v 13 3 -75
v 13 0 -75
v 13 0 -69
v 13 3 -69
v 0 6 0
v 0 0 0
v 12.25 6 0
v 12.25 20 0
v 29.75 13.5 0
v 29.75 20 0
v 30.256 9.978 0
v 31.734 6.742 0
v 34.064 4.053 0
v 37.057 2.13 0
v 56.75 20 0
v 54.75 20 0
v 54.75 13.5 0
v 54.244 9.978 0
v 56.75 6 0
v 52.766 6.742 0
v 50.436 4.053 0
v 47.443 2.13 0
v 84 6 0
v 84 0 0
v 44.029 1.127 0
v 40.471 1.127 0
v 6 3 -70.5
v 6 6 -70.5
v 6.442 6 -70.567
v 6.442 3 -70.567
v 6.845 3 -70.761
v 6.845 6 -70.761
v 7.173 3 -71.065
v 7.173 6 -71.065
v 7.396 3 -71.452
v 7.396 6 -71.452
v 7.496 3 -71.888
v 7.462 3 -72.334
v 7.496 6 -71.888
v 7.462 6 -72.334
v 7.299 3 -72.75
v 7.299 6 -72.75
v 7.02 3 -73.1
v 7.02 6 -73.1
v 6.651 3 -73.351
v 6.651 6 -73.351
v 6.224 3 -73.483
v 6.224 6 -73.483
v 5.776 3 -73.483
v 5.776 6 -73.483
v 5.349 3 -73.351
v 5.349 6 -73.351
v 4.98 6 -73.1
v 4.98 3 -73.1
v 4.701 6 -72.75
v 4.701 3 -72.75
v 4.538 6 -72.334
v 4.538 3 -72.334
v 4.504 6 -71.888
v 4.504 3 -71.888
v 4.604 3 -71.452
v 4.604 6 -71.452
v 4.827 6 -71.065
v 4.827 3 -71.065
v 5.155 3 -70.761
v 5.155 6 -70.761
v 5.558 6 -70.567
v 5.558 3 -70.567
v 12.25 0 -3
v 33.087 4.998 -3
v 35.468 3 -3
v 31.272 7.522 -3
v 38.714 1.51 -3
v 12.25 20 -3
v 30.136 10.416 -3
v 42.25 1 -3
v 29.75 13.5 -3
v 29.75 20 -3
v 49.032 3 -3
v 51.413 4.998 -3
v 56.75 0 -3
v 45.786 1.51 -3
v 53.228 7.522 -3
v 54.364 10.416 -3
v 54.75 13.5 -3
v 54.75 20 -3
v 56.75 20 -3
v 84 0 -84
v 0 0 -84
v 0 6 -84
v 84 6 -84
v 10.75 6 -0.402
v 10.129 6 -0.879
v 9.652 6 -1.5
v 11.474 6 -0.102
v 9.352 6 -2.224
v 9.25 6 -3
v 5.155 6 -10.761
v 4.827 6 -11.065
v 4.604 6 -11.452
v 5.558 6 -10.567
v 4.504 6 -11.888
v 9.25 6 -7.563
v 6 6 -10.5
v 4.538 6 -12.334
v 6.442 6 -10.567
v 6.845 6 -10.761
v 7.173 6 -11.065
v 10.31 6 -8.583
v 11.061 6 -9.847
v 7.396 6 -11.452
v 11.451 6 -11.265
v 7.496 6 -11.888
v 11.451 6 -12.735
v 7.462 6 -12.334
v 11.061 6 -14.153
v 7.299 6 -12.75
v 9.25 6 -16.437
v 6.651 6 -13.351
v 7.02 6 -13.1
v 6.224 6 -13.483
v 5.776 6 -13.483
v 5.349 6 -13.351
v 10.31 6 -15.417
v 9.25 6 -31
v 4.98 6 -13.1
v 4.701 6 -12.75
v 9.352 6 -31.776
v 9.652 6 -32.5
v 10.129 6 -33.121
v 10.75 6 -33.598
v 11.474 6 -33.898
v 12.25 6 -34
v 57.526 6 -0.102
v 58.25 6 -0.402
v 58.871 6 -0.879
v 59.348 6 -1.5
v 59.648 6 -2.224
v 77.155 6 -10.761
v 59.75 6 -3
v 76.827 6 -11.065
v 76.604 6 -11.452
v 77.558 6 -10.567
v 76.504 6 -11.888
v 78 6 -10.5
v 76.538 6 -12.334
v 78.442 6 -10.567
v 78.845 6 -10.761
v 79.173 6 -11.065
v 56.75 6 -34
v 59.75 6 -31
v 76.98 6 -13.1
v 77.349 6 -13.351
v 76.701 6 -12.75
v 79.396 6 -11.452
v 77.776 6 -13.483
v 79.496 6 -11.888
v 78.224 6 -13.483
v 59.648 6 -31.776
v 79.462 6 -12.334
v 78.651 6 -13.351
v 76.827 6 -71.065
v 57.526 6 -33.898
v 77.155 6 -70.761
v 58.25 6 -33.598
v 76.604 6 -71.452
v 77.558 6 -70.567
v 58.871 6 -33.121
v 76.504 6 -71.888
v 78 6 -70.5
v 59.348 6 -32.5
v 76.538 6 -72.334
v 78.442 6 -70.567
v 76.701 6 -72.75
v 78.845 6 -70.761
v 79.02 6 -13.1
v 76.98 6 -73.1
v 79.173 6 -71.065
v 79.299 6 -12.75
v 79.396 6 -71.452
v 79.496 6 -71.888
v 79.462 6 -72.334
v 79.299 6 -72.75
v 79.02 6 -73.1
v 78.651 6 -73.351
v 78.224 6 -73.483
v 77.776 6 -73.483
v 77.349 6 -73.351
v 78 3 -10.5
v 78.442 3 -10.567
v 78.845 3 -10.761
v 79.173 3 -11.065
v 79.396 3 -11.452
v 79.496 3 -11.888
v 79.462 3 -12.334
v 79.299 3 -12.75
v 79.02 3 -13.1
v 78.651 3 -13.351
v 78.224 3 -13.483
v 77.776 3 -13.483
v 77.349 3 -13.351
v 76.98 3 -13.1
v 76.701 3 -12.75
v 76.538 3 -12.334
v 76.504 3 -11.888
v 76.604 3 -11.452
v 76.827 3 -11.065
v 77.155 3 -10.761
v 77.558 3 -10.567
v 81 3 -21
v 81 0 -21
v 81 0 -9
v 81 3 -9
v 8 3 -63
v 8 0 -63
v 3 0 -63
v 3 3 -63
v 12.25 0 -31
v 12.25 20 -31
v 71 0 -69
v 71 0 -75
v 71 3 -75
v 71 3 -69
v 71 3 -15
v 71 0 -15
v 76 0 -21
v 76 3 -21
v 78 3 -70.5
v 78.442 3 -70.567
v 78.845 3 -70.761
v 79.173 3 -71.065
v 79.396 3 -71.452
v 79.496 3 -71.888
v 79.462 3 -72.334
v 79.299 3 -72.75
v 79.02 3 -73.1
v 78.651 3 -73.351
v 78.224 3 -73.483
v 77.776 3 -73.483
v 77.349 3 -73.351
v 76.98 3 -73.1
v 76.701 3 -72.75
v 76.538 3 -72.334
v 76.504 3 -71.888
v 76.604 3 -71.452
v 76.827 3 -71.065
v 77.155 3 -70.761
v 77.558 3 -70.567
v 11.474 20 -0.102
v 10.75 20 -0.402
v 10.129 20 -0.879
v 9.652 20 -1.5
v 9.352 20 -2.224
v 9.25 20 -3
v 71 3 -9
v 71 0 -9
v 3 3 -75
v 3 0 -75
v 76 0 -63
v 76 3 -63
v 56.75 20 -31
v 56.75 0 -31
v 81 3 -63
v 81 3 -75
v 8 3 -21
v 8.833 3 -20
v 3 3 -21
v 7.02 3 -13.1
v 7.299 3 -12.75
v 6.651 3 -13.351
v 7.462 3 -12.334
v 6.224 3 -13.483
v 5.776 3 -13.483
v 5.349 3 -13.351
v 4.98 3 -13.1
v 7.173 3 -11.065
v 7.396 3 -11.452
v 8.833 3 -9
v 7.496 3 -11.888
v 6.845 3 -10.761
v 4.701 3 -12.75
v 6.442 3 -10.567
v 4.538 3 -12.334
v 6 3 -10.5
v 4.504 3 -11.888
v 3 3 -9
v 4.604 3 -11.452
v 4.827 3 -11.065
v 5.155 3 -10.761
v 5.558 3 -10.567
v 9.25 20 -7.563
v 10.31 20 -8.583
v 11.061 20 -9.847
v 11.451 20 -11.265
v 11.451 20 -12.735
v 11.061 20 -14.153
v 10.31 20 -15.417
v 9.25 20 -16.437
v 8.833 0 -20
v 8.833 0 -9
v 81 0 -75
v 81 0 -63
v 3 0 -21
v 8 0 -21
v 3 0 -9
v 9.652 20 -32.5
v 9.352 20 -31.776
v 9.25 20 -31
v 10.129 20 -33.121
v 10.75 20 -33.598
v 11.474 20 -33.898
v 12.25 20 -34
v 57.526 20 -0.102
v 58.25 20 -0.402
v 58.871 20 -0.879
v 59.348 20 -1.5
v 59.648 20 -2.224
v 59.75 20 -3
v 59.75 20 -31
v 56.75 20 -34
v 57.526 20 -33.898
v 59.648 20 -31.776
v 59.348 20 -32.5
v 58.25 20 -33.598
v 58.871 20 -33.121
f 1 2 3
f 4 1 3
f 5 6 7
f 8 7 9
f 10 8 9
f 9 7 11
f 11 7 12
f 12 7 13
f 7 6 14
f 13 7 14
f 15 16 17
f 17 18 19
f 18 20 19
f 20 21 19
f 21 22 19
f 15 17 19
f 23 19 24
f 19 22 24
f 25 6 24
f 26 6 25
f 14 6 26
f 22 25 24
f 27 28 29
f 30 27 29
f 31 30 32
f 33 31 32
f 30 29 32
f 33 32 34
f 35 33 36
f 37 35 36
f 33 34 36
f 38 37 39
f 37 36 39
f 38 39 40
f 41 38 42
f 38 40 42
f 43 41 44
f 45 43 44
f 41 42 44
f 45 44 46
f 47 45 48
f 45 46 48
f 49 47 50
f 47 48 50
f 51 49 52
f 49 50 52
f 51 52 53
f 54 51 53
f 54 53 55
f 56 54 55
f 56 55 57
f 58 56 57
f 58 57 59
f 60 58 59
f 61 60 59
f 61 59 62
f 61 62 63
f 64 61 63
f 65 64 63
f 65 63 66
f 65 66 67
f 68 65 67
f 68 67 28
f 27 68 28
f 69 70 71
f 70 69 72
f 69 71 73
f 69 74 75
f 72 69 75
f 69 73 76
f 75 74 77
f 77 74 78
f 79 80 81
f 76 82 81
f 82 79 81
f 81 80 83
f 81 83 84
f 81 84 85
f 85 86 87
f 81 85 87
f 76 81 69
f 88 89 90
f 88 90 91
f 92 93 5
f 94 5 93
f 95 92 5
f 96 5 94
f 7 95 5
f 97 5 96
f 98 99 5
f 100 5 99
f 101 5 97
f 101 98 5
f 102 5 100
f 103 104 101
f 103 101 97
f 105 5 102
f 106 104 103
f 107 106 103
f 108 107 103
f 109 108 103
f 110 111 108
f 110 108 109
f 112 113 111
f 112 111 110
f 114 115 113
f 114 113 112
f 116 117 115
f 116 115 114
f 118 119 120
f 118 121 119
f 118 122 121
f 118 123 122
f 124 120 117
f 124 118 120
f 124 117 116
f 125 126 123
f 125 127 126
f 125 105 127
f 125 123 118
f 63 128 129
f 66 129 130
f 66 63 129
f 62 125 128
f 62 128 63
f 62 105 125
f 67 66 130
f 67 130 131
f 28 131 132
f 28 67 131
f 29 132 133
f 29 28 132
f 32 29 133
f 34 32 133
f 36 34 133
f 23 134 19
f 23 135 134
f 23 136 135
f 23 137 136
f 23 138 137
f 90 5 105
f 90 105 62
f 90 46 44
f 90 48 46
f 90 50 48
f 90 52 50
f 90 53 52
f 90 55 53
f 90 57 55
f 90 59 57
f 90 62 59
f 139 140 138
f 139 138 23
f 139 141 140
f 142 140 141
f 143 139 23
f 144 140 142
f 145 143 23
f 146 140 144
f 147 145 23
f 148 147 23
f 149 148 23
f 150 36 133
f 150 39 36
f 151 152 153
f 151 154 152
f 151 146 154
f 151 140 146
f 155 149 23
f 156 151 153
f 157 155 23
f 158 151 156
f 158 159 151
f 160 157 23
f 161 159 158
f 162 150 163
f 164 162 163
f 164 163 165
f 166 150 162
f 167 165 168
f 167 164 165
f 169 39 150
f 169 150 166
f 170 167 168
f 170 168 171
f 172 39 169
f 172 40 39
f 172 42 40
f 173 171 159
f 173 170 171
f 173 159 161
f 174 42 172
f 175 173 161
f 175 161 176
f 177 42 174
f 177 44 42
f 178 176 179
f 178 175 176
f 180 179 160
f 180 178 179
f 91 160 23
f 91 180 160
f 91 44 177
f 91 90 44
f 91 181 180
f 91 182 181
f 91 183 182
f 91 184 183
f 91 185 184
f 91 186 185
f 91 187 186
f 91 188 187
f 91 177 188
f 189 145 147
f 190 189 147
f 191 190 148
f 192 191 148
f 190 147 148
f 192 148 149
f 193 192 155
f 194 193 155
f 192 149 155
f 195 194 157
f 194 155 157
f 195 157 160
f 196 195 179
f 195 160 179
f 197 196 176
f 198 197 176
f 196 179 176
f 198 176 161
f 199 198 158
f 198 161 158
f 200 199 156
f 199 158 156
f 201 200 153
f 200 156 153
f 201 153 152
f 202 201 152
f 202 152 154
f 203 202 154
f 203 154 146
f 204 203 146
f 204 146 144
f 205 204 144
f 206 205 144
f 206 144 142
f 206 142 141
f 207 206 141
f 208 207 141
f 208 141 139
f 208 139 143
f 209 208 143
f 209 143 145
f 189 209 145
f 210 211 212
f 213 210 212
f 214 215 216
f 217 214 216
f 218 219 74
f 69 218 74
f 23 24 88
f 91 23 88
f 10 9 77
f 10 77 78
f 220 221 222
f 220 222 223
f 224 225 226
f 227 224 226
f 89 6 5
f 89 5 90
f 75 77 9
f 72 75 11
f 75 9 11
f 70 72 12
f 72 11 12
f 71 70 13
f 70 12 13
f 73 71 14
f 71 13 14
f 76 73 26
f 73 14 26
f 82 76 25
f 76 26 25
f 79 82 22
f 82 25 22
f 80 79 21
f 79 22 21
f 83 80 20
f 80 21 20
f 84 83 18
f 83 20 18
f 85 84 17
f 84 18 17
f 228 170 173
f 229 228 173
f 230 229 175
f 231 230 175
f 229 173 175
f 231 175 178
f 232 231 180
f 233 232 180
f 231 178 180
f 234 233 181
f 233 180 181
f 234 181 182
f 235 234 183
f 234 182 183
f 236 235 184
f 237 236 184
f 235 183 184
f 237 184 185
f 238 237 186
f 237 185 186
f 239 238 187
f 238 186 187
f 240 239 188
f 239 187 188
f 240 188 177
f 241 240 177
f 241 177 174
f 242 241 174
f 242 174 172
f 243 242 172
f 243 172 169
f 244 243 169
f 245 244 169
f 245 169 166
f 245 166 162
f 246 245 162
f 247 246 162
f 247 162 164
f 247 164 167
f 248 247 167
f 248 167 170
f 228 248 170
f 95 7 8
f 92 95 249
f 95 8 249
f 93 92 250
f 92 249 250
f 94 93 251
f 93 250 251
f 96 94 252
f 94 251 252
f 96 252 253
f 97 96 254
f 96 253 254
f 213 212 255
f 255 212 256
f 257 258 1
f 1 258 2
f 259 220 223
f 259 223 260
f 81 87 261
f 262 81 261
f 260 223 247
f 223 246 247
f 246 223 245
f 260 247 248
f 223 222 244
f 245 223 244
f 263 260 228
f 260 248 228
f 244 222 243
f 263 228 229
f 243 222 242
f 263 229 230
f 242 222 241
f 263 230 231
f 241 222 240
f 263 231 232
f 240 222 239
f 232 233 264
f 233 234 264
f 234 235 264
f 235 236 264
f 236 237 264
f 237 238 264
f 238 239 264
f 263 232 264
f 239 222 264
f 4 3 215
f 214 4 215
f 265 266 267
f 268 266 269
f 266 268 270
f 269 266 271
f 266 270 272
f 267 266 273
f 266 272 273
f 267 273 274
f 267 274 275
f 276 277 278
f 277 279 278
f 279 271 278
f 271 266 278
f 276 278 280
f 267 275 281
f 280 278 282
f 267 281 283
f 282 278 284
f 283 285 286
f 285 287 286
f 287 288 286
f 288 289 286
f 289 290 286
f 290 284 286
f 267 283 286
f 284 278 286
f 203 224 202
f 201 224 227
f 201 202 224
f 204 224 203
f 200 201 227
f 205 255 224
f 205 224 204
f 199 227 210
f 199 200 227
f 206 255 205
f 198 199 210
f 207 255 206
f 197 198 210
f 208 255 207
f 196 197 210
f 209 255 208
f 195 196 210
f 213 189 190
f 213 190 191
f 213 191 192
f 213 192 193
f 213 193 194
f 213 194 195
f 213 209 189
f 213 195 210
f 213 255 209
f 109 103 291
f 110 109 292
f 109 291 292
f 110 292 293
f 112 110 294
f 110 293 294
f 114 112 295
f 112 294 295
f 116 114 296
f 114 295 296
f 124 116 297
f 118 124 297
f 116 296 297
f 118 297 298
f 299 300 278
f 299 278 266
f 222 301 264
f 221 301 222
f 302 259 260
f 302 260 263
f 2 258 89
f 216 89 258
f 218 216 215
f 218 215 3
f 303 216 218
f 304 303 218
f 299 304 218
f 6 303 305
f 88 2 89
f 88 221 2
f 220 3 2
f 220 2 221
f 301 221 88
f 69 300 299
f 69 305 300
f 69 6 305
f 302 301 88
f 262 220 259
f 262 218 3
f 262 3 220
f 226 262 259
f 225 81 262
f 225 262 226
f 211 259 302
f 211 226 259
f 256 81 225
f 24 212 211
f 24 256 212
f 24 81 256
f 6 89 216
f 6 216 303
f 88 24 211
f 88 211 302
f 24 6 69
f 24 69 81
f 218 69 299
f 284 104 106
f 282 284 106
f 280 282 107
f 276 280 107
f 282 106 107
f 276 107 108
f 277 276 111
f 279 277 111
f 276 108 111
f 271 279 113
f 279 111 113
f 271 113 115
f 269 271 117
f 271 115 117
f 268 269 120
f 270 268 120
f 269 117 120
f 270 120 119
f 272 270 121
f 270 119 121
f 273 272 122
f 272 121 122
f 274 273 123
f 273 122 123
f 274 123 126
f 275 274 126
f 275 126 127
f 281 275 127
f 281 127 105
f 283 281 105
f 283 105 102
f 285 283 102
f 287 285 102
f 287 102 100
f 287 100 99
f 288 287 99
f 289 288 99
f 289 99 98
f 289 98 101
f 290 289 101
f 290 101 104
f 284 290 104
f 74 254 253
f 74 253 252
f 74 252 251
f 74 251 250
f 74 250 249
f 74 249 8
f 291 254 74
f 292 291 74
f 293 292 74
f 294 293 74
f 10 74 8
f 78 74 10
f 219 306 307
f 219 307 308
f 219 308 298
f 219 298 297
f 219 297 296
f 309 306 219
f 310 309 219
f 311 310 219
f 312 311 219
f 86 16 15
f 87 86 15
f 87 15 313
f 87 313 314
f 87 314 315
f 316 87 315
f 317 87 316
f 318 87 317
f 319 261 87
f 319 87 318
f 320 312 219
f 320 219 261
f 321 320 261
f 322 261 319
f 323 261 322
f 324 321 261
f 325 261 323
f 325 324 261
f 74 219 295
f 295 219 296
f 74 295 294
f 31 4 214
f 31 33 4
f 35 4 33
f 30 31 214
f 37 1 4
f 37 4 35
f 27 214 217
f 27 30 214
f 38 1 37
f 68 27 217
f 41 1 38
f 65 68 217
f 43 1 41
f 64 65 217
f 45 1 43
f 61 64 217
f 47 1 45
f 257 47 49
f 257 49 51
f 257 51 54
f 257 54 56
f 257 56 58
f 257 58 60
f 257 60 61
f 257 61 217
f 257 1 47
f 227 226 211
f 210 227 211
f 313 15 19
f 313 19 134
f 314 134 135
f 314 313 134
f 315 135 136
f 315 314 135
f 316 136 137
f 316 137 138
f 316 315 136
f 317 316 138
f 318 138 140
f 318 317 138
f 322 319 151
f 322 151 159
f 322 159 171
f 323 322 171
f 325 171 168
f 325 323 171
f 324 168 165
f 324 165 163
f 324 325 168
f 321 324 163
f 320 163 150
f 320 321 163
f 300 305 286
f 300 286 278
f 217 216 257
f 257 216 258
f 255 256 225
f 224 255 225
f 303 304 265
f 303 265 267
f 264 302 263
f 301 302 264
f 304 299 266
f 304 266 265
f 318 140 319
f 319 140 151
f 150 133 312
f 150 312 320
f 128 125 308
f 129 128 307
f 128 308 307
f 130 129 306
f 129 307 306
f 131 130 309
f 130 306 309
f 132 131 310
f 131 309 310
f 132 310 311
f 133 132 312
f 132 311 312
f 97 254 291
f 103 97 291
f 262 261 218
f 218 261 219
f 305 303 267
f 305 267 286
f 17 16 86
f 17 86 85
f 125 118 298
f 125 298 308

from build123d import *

# Parameters (mm, degrees)
SKETCH1_W                                = 84
SKETCH1_H                                = 84
BOSS_EXTRUDE1_DEPTH                      = 6
SKETCH2_R                                = 1.5
CUT_EXTRUDE1_DEPTH                       = 119.94536561
SKETCH5_W                                = 50.5
SKETCH5_H                                = 34
BOSS_EXTRUDE2_DEPTH                      = 22
SKETCH6_W                                = 44.5
SKETCH6_H                                = 28
CUT_EXTRUDE5_DEPTH                       = 25
FILLET1_R                                = 3
SKETCH8_R                                = 12.5
CUT_EXTRUDE6_DEPTH                       = 10
CUT_EXTRUDE7_DEPTH                       = 123.049170419
CUT_EXTRUDE7_DEPTH_BACK                  = 123.049170419
SKETCH9_W                                = 84
SKETCH9_H                                = 8
CUT_EXTRUDE8_DEPTH                       = 3
MIRROR1_AT_THE_SECOND_PLANE_COPY_1_DEPTH = 3
SKETCH13_R                               = 5.5
CUT_EXTRUDE9_DEPTH                       = 14
CUT_EXTRUDE10_DEPTH                      = 10
CUT_EXTRUDE11_DEPTH                      = 10
BOSS_EXTRUDE3_DEPTH                      = 3
CUT_EXTRUDE14_DEPTH                      = 4
SKETCH20_W                               = 13.564659966
SKETCH20_H                               = 7
CUT_EXTRUDE15_DEPTH                      = 4


with BuildPart() as part:
    # Sketch1 → Boss-Extrude1 (new body)
    with BuildSketch(Plane(origin=(0, 0, 0), x_dir=(1, 0, 0), z_dir=(0, 1, 0))):
        with Locations((42, 42)):
            Rectangle(SKETCH1_W, SKETCH1_H)
    extrude(amount=BOSS_EXTRUDE1_DEPTH)

    # Sketch2 → Cut-Extrude1 (cut, through all)
    with BuildSketch(Plane(origin=(0, 6, 0), x_dir=(1, 0, 0), z_dir=(0, 1, 0))):
        with Locations(Location((6, 72, 0), (0, 0, 270))):
            Circle(SKETCH2_R)
        with Locations(Location((6, 12, 0), (0, 0, 270))):
            Circle(SKETCH2_R)
        with Locations(Location((78, 12, 0), (0, 0, 270))):
            Circle(SKETCH2_R)
        with Locations(Location((78, 72, 0), (0, 0, 270))):
            Circle(SKETCH2_R)
    extrude(amount=-CUT_EXTRUDE1_DEPTH, mode=Mode.SUBTRACT)

    # Sketch5 → Boss-Extrude2 (add)
    with BuildSketch(Plane(origin=(0, 6, 0), x_dir=(1, 0, 0), z_dir=(0, 1, 0))):
        with Locations((34.5, 17)):
            Rectangle(SKETCH5_W, SKETCH5_H)
    extrude(amount=BOSS_EXTRUDE2_DEPTH)

    # Sketch6 → Cut-Extrude5 (cut)
    with BuildSketch(Plane(origin=(0, 28, 0), x_dir=(1, 0, 0), z_dir=(0, 1, 0))):
        with Locations((34.5, 17)):
            Rectangle(SKETCH6_W, SKETCH6_H)
    extrude(amount=-CUT_EXTRUDE5_DEPTH, mode=Mode.SUBTRACT)

    # Fillet1
    fillet1_edges = [part.edges().sort_by_distance(p)[0] for p in [
        (59.75, 17, -34),
        (9.25, 17, -34),
        (9.25, 17, 0),
        (59.75, 17, 0),
    ]]
    fillet(fillet1_edges, radius=FILLET1_R)

    # Sketch8 → Cut-Extrude6 (cut)
    with BuildSketch(Plane.XY):
        with Locations((42.25, 13.5)):
            Circle(SKETCH8_R)
    extrude(amount=-CUT_EXTRUDE6_DEPTH, mode=Mode.SUBTRACT)

    # Sketch9 → Cut-Extrude7 (cut, two sides: drawn at the far end of the back side and taken through both)
    with BuildSketch(Plane.XY.offset(-CUT_EXTRUDE7_DEPTH_BACK)):
        with Locations((42, 24)):
            Rectangle(SKETCH9_W, SKETCH9_H)
    extrude(amount=CUT_EXTRUDE7_DEPTH + CUT_EXTRUDE7_DEPTH_BACK, mode=Mode.SUBTRACT)

    # Sketch11 → Cut-Extrude8 (cut)
    with BuildSketch(Plane.XZ):
        Polygon((3, -9), (13, -9), (13, -15), (8, -21), (3, -21), align=None)
    cut_extrude8 = extrude(amount=-CUT_EXTRUDE8_DEPTH, mode=Mode.SUBTRACT)

    # Mirror1: Cut-Extrude8 across plane
    add(cut_extrude8.mirror(Plane.XY.offset(-42)), mode=Mode.SUBTRACT)

    # Mirror1 at the second plane: Cut-Extrude8 across plane
    add(cut_extrude8.mirror(Plane.ZY.offset(-42)), mode=Mode.SUBTRACT)

    # Mirror1 at the second plane copy 1 sketc → Mirror1 at the second plane copy 1 (cut)
    with BuildSketch(Plane(origin=(84, 0, -84), x_dir=(-1, 0, 0), z_dir=(0, -1, 0))):
        Polygon((3, -9), (13, -9), (13, -15), (8, -21), (3, -21), align=None)
    extrude(amount=-MIRROR1_AT_THE_SECOND_PLANE_COPY_1_DEPTH, mode=Mode.SUBTRACT)

    # Sketch13 → Cut-Extrude9 (cut)
    with BuildSketch(Plane(origin=(0, 20, 0), x_dir=(1, 0, 0), z_dir=(0, 1, 0))):
        with Locations((6, 12)):
            Circle(SKETCH13_R)
    extrude(amount=-CUT_EXTRUDE9_DEPTH, mode=Mode.SUBTRACT)

    # Sketch14 → Cut-Extrude10 (cut)
    with BuildSketch(Plane.XY):
        Polygon((29.75, 13.5), (29.75, 20), (31.572921748, 20), align=None)
    extrude(amount=-CUT_EXTRUDE10_DEPTH, mode=Mode.SUBTRACT)

    # Sketch15 → Cut-Extrude11 (cut)
    with BuildSketch(Plane.XY):
        Polygon((54.75, 20), (54.75, 13.5), (52.927078252, 20), align=None)
    extrude(amount=-CUT_EXTRUDE11_DEPTH, mode=Mode.SUBTRACT)

    # Sketch17 → Boss-Extrude3 (add)
    with BuildSketch(Plane.XZ):
        Polygon((8.833333333, -9), (8.833333333, -20), (13, -15), (13, -9), align=None)
    extrude(amount=-BOSS_EXTRUDE3_DEPTH)

    # Sketch18 → Cut-Extrude14 (cut)
    with BuildSketch(Plane(origin=(0, 3, 0), x_dir=(1, 0, 0), z_dir=(0, 1, 0))):
        Polygon((35.467670017, 3), (35.467670017, 10), (49.032329983, 10), (49.032329983, 3), (56.75, 3), (56.75, 31), (12.25, 31), (12.25, 3), align=None)
    extrude(amount=-CUT_EXTRUDE14_DEPTH, mode=Mode.SUBTRACT)

    # Sketch20 → Cut-Extrude15 (cut)
    with BuildSketch(Plane.XZ):
        with Locations((42.25, -6.5)):
            Rectangle(SKETCH20_W, SKETCH20_H)
    extrude(amount=-CUT_EXTRUDE15_DEPTH, mode=Mode.SUBTRACT)


solid = part.part
